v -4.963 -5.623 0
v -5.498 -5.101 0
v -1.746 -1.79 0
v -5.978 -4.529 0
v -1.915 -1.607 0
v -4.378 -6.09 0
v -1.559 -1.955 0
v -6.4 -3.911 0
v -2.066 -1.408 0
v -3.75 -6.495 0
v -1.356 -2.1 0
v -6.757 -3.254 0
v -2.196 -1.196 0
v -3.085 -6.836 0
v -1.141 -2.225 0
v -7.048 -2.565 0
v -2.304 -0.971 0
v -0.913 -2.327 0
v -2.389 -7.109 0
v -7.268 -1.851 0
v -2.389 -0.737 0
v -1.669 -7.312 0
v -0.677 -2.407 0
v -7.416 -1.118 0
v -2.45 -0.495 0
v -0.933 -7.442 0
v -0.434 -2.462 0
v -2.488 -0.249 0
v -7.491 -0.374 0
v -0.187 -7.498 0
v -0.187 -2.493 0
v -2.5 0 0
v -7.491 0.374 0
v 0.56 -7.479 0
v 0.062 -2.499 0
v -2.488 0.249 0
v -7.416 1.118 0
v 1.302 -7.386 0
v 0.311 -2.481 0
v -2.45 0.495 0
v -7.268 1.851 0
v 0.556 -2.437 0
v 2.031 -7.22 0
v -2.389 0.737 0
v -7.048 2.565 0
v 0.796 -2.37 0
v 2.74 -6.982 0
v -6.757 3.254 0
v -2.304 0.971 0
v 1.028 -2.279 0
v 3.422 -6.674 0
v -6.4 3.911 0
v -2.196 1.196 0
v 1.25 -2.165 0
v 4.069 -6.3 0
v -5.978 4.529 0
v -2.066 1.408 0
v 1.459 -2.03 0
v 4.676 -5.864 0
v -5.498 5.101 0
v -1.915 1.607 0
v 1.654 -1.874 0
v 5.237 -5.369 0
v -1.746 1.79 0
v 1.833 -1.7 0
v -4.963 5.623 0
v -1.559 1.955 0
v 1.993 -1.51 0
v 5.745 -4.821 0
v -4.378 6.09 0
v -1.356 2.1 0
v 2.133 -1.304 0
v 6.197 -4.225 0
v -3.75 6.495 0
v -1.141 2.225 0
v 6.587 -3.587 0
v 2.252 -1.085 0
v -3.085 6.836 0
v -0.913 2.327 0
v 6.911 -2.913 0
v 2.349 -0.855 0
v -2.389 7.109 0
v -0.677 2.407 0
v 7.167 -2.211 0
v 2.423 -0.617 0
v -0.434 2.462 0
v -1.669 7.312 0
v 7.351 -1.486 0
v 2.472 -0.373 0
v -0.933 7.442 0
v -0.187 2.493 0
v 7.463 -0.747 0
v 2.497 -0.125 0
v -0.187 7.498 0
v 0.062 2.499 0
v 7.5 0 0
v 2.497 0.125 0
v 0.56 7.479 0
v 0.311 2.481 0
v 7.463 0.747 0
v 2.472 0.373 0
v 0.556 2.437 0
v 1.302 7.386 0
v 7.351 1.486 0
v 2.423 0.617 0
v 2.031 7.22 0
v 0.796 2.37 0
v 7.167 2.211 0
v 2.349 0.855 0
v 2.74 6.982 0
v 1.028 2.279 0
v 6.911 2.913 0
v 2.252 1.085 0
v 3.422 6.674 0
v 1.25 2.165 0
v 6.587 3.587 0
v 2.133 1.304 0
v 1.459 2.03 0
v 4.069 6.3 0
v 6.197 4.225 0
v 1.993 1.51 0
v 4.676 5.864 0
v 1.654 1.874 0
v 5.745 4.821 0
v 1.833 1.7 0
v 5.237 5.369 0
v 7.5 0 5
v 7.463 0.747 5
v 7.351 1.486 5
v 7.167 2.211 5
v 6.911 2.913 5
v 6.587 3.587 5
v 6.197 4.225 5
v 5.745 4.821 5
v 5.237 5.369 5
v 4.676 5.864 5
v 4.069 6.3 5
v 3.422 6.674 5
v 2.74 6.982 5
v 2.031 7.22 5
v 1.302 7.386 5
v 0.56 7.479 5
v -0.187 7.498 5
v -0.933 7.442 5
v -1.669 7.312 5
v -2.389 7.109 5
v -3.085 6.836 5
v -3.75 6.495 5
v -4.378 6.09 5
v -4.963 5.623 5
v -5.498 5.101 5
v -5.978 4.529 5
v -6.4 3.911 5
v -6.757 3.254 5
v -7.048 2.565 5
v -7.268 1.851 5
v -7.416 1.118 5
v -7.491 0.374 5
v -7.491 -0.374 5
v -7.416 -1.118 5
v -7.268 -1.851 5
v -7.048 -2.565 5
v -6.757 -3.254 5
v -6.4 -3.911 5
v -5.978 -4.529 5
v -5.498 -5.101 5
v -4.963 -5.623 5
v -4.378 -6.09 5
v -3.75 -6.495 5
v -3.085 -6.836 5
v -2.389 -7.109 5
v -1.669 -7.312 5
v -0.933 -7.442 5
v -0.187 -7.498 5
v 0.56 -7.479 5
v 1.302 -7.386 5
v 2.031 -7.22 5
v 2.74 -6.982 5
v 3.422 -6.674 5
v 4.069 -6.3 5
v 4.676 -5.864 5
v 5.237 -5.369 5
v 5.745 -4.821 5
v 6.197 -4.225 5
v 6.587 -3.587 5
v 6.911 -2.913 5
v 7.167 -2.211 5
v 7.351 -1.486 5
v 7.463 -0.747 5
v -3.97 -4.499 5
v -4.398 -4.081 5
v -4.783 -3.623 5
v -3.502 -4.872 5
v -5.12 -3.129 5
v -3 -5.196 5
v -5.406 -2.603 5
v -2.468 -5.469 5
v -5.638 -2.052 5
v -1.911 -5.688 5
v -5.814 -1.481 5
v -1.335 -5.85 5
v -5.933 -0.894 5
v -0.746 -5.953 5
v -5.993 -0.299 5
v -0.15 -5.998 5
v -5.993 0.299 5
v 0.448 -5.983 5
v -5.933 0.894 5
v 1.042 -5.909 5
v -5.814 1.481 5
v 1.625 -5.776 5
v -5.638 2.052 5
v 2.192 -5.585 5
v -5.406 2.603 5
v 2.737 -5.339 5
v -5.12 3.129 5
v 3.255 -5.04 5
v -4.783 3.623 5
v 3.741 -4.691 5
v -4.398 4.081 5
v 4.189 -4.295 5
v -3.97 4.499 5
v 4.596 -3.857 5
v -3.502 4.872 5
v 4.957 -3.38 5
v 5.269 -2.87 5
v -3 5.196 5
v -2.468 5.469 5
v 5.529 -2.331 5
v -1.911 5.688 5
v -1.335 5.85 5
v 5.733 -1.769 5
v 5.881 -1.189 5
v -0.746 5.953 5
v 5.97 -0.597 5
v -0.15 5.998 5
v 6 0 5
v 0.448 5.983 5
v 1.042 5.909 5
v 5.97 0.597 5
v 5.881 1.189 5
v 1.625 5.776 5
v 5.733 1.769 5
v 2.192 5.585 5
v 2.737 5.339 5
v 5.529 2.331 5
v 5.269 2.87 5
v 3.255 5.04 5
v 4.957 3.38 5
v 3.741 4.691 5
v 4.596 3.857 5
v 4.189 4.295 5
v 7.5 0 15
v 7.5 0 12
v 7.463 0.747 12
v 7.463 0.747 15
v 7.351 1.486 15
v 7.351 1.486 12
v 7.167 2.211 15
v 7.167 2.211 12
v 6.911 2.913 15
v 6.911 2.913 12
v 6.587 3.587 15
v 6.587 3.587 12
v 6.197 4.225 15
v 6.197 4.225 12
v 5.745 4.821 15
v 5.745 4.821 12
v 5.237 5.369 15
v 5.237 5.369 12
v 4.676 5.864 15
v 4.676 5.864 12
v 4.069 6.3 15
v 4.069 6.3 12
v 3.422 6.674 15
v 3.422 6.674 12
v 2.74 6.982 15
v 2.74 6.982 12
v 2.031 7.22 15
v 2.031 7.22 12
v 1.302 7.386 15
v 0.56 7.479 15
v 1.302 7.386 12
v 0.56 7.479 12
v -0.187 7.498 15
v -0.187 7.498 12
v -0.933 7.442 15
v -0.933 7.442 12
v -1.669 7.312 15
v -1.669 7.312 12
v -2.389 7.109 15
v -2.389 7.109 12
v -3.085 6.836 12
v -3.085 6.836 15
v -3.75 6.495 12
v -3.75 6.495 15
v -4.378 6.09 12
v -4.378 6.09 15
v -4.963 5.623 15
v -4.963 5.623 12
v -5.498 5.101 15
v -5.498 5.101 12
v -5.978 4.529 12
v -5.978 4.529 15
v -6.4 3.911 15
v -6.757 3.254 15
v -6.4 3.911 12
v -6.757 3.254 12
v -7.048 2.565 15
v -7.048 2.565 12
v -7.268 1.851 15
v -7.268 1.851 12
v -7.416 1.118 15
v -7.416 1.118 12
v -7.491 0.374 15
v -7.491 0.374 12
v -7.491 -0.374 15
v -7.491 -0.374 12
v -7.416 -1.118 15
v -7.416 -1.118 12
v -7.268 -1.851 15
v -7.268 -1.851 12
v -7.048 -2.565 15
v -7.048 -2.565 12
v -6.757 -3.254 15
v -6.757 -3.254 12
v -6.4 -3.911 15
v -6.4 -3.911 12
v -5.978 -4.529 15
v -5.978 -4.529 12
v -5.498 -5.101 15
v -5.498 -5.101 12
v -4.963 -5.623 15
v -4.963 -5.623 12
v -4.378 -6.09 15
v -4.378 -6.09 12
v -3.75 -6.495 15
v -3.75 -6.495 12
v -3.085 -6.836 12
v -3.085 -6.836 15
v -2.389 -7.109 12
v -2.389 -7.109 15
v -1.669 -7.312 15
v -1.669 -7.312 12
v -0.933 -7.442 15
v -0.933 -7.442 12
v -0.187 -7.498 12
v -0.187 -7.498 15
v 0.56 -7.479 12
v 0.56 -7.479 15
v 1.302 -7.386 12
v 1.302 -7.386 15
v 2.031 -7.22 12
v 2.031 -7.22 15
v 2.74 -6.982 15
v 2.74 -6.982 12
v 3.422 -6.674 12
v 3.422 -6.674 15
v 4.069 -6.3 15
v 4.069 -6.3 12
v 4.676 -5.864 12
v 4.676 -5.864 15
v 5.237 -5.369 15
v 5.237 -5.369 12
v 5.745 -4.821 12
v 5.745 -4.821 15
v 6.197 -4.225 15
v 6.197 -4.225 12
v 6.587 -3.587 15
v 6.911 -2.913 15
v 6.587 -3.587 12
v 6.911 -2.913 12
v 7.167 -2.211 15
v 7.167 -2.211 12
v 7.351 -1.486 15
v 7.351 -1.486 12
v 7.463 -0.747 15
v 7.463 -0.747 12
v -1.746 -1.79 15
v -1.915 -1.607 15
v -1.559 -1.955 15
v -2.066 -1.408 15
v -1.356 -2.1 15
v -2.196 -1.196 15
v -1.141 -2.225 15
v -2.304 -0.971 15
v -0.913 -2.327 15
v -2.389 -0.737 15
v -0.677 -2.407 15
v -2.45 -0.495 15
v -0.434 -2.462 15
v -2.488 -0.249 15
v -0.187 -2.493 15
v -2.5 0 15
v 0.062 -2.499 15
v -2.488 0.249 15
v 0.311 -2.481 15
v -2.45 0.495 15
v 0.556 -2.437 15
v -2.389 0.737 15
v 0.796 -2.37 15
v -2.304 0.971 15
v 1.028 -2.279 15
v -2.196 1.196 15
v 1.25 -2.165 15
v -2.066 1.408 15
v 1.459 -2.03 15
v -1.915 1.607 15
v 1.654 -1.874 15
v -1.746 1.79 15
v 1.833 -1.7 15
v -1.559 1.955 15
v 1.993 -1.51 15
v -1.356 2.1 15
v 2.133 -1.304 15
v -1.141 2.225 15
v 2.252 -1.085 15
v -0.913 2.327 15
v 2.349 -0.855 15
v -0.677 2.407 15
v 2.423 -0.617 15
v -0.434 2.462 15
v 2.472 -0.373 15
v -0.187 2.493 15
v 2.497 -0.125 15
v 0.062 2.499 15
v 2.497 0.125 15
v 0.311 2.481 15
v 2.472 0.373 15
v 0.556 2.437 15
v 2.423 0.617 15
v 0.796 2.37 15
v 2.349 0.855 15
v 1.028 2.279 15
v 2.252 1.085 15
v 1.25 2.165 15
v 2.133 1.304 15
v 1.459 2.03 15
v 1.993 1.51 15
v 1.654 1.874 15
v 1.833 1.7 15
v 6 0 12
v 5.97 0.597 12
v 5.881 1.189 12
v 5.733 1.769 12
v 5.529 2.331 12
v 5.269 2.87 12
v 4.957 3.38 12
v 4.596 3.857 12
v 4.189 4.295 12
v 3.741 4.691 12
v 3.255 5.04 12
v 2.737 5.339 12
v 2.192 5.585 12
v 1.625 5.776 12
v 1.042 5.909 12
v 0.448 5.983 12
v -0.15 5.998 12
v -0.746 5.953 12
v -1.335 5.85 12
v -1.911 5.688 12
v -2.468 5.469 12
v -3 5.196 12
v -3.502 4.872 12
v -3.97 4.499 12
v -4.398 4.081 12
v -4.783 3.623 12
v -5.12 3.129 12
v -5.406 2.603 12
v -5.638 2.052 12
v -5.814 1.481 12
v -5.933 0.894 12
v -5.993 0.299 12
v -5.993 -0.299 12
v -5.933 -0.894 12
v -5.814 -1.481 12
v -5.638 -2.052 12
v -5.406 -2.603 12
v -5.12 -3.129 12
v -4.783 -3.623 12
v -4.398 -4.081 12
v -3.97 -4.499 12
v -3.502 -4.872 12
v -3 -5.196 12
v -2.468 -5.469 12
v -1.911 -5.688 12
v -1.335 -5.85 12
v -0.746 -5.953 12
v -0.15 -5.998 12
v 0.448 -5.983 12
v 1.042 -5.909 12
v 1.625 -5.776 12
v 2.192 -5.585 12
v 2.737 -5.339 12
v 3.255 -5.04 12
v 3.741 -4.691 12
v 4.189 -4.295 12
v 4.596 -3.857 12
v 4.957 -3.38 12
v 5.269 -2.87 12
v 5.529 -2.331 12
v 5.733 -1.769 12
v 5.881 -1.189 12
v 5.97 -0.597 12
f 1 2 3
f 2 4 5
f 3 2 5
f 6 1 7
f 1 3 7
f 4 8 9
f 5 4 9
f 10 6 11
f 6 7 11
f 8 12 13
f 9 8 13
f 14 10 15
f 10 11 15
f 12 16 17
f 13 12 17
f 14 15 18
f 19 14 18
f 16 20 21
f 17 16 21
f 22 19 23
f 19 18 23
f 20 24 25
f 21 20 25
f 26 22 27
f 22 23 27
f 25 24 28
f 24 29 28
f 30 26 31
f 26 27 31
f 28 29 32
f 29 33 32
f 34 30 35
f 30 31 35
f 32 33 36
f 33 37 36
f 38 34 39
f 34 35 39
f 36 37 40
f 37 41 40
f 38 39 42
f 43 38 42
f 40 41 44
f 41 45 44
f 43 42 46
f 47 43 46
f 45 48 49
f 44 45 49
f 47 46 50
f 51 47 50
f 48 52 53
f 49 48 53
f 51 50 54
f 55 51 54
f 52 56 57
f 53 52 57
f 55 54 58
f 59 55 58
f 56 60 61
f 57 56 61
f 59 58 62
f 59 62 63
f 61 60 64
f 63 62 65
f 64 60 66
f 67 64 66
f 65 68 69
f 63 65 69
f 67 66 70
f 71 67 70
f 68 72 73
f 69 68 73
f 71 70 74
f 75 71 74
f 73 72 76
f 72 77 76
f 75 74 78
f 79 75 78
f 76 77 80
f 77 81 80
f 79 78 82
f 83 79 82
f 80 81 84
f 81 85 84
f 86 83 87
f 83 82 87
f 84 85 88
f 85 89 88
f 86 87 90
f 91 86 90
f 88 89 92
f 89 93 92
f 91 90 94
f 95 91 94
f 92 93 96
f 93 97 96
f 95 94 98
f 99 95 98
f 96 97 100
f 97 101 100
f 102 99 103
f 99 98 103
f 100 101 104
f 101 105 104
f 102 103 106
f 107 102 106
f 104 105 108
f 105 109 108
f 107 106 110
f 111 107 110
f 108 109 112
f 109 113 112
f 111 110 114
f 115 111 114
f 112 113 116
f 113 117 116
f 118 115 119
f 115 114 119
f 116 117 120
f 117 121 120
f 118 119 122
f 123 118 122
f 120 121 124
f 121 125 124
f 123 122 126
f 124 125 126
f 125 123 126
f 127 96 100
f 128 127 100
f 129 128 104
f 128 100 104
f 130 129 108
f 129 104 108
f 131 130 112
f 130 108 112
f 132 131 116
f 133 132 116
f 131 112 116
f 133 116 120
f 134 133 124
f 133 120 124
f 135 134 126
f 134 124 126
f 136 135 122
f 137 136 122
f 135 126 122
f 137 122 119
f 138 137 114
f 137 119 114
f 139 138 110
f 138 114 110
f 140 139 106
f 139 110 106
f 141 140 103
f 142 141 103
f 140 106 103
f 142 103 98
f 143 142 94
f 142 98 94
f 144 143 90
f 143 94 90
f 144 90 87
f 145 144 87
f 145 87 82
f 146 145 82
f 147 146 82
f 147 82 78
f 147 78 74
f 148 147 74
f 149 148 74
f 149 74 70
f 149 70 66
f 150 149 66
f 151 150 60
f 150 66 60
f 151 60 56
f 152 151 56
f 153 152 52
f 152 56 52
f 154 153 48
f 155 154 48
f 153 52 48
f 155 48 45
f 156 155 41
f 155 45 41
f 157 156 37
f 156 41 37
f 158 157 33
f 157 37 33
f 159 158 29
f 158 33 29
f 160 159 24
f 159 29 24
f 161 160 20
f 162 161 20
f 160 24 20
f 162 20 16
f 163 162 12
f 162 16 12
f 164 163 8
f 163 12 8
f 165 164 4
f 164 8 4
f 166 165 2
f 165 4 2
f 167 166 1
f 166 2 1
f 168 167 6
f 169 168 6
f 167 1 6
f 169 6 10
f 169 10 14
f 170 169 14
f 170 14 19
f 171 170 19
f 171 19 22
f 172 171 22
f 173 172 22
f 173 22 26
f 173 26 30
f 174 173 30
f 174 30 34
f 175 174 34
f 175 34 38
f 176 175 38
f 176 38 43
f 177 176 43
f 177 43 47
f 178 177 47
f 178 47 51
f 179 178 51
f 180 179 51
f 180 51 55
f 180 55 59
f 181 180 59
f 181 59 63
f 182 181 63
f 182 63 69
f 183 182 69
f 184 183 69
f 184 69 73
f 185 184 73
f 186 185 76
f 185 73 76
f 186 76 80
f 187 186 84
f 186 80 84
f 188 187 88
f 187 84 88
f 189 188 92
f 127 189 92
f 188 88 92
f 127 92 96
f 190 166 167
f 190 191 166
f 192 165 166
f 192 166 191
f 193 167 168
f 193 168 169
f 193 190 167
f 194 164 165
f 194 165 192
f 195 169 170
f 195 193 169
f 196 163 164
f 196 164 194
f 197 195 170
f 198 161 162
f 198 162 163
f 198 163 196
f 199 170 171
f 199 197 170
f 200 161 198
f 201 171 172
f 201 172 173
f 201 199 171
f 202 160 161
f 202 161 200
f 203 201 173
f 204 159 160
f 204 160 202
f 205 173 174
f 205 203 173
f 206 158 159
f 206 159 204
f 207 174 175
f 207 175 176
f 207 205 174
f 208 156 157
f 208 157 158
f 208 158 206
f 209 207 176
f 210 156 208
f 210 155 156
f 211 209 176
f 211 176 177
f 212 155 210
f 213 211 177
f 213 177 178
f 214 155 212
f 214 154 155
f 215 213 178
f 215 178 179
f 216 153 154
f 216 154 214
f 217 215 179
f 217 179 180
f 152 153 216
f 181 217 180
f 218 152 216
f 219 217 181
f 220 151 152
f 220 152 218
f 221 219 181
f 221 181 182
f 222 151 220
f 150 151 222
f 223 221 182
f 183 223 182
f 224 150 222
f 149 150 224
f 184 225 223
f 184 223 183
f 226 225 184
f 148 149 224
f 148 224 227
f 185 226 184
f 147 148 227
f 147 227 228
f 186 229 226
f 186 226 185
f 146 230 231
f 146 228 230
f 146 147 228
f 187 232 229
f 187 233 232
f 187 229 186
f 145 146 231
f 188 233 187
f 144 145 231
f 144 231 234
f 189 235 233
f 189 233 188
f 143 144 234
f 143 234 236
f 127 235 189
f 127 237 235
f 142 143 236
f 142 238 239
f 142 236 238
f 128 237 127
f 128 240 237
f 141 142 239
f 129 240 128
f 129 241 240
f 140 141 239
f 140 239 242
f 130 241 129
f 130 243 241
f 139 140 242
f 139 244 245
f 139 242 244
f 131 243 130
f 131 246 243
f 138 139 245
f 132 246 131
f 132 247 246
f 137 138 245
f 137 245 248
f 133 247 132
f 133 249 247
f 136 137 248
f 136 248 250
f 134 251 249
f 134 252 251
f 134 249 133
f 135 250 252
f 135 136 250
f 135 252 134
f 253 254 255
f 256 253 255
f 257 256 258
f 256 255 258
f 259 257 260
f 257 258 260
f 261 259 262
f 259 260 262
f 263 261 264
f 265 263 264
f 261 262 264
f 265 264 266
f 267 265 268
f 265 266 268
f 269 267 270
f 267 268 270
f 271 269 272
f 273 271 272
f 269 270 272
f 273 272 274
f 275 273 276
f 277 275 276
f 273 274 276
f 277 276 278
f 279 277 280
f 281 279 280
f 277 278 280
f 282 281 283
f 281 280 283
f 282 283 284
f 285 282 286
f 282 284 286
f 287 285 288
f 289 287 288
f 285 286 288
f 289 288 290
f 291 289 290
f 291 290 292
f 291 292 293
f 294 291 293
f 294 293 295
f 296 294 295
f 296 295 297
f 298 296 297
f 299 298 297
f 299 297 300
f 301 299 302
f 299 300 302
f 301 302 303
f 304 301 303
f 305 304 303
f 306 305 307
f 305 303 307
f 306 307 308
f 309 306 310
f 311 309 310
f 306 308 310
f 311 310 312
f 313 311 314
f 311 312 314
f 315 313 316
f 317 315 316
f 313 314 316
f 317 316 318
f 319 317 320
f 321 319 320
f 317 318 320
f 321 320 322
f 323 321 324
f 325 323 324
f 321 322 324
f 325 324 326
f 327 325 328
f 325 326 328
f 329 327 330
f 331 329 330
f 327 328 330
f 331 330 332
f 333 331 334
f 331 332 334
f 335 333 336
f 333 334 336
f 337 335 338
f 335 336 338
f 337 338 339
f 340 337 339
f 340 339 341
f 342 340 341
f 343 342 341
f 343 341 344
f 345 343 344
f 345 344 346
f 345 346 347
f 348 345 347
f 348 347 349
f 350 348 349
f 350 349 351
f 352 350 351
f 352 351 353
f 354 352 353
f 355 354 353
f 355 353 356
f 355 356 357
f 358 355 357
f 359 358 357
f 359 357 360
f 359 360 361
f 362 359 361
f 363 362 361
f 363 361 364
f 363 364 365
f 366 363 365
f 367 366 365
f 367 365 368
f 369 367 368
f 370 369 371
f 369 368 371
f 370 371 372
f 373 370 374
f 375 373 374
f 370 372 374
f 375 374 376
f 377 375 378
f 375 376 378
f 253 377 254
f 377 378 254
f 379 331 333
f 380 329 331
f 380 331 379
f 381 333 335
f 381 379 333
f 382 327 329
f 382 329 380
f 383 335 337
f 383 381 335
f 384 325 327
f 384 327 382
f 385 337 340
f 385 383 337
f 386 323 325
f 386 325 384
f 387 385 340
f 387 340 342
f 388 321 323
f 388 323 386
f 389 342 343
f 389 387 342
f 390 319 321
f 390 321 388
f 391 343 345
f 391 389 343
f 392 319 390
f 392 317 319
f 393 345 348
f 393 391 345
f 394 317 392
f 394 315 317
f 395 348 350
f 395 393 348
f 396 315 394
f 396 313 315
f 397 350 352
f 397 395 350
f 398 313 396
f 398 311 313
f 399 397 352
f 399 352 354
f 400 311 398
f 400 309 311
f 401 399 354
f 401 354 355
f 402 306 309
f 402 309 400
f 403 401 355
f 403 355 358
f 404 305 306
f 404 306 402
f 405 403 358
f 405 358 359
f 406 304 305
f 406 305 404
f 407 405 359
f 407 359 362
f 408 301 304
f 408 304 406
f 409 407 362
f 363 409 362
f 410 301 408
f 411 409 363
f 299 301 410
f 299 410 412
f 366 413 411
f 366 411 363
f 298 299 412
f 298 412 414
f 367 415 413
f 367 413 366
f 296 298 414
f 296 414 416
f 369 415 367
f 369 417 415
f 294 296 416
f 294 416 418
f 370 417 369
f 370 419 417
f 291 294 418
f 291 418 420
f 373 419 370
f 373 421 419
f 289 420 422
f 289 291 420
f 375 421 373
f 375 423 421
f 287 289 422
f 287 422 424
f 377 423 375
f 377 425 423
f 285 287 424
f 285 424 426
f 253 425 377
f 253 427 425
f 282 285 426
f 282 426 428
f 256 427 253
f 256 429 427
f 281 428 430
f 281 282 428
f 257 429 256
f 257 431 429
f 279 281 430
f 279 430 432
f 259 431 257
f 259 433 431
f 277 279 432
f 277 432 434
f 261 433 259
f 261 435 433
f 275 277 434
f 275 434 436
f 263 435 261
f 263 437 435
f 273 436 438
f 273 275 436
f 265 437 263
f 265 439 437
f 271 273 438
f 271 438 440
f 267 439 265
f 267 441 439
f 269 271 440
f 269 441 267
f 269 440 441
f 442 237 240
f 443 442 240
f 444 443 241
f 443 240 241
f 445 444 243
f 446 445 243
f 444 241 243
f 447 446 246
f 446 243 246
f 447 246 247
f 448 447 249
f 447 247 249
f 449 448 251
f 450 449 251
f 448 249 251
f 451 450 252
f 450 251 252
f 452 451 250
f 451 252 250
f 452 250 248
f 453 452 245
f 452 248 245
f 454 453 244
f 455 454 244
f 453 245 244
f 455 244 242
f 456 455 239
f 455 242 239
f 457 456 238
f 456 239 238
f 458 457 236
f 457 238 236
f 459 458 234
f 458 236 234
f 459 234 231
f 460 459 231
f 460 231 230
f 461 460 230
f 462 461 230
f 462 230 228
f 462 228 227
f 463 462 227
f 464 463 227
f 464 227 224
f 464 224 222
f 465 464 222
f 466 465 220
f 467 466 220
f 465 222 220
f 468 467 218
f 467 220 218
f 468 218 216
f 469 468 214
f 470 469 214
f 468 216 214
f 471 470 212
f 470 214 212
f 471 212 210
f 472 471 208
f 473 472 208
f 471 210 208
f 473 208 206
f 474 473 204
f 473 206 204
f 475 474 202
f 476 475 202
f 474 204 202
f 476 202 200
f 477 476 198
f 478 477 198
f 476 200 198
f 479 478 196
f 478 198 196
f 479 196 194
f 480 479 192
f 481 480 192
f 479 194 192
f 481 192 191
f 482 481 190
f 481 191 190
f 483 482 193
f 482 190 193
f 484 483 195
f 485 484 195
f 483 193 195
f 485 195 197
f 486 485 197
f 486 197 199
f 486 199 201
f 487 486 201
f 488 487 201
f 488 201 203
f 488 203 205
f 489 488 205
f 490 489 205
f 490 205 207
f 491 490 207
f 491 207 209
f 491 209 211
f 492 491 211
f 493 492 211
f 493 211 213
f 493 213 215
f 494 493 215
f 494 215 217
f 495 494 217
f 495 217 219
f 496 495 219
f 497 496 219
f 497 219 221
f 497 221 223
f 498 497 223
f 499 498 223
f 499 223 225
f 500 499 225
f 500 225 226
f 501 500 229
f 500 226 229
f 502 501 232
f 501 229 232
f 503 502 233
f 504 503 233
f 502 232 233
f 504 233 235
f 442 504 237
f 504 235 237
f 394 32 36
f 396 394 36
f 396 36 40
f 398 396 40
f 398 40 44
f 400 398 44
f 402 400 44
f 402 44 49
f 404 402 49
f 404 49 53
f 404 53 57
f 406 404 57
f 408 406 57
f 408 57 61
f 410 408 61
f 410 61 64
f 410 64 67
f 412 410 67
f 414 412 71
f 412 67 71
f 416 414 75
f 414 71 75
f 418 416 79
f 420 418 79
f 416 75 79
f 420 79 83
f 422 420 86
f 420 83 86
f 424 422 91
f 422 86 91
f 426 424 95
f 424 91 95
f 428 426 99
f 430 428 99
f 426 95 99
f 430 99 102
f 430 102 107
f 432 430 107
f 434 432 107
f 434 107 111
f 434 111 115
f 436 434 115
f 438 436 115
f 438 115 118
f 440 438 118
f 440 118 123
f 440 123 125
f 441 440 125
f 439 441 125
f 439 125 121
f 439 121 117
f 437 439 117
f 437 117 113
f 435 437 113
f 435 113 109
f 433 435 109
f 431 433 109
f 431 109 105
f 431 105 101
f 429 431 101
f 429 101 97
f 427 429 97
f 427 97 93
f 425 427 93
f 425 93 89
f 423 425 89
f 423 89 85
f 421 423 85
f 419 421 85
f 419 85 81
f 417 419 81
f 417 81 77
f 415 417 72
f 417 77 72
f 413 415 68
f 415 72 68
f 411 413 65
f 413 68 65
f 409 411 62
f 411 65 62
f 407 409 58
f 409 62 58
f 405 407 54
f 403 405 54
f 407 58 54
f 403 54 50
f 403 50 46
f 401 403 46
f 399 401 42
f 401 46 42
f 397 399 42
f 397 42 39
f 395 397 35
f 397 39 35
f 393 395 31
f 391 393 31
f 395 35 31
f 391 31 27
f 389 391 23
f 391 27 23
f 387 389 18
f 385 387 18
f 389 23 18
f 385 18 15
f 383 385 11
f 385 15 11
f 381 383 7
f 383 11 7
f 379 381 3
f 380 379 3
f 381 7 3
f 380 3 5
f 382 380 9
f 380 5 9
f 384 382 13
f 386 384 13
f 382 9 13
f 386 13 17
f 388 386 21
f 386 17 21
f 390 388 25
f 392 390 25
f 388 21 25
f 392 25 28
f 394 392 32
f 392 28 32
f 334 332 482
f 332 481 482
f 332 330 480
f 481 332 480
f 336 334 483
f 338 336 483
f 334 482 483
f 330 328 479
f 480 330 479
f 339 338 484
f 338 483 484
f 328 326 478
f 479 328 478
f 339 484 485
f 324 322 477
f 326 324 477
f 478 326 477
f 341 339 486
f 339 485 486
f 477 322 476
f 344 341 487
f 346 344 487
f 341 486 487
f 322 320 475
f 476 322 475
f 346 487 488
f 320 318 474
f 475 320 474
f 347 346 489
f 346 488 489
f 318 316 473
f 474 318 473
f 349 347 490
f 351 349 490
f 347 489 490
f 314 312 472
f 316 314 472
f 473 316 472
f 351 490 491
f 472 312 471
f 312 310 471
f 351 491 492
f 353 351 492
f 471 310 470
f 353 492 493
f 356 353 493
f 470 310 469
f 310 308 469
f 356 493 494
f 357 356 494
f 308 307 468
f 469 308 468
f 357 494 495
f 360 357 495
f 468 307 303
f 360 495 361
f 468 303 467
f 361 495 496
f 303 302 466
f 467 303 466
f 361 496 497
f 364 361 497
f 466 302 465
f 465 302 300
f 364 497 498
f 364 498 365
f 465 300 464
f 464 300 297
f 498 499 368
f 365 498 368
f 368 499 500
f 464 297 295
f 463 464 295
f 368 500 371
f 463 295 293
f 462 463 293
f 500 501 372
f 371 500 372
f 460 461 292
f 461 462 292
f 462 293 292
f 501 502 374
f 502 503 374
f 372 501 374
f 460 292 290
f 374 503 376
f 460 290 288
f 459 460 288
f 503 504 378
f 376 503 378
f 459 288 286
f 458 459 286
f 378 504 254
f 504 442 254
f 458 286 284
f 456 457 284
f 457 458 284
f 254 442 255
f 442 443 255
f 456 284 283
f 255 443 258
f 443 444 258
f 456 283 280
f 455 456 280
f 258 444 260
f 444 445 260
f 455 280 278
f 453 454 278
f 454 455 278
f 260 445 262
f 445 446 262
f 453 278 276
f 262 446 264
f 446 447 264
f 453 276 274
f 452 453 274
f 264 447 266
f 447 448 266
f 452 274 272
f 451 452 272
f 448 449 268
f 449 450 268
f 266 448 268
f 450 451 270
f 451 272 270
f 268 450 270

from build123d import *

# Parameters (mm, degrees)
ESQUISSE1_R             = 7.5
BOSS_EXTRU_1_DEPTH      = 5
ESQUISSE2_R             = 6
BOSS_EXTRU_2_DEPTH      = 7
ESQUISSE3_R             = 7.5
BOSS_EXTRU_3_DEPTH      = 3
ESQUISSE4_R             = 2.5
ENL_V_MAT_EXTRU_1_DEPTH = 30


with BuildPart() as part:
    # Esquisse1 → Boss.-Extru.1 (new body)
    with BuildSketch(Plane.XY):
        Circle(ESQUISSE1_R)
    extrude(amount=BOSS_EXTRU_1_DEPTH)

    # Esquisse2 → Boss.-Extru.2 (add)
    with BuildSketch(Plane.XY.offset(5)):
        Circle(ESQUISSE2_R)
    extrude(amount=BOSS_EXTRU_2_DEPTH)

    # Esquisse3 → Boss.-Extru.3 (add)
    with BuildSketch(Plane.XY.offset(12)):
        Circle(ESQUISSE3_R)
    extrude(amount=BOSS_EXTRU_3_DEPTH)

    # Esquisse4 → Enlèv. mat.-Extru.1 (cut)
    with BuildSketch(Plane(origin=(0, 0, 0), x_dir=(-1, 0, 0), z_dir=(0, 0, -1))):
        Circle(ESQUISSE4_R)
    extrude(amount=-ENL_V_MAT_EXTRU_1_DEPTH, mode=Mode.SUBTRACT)


solid = part.part
